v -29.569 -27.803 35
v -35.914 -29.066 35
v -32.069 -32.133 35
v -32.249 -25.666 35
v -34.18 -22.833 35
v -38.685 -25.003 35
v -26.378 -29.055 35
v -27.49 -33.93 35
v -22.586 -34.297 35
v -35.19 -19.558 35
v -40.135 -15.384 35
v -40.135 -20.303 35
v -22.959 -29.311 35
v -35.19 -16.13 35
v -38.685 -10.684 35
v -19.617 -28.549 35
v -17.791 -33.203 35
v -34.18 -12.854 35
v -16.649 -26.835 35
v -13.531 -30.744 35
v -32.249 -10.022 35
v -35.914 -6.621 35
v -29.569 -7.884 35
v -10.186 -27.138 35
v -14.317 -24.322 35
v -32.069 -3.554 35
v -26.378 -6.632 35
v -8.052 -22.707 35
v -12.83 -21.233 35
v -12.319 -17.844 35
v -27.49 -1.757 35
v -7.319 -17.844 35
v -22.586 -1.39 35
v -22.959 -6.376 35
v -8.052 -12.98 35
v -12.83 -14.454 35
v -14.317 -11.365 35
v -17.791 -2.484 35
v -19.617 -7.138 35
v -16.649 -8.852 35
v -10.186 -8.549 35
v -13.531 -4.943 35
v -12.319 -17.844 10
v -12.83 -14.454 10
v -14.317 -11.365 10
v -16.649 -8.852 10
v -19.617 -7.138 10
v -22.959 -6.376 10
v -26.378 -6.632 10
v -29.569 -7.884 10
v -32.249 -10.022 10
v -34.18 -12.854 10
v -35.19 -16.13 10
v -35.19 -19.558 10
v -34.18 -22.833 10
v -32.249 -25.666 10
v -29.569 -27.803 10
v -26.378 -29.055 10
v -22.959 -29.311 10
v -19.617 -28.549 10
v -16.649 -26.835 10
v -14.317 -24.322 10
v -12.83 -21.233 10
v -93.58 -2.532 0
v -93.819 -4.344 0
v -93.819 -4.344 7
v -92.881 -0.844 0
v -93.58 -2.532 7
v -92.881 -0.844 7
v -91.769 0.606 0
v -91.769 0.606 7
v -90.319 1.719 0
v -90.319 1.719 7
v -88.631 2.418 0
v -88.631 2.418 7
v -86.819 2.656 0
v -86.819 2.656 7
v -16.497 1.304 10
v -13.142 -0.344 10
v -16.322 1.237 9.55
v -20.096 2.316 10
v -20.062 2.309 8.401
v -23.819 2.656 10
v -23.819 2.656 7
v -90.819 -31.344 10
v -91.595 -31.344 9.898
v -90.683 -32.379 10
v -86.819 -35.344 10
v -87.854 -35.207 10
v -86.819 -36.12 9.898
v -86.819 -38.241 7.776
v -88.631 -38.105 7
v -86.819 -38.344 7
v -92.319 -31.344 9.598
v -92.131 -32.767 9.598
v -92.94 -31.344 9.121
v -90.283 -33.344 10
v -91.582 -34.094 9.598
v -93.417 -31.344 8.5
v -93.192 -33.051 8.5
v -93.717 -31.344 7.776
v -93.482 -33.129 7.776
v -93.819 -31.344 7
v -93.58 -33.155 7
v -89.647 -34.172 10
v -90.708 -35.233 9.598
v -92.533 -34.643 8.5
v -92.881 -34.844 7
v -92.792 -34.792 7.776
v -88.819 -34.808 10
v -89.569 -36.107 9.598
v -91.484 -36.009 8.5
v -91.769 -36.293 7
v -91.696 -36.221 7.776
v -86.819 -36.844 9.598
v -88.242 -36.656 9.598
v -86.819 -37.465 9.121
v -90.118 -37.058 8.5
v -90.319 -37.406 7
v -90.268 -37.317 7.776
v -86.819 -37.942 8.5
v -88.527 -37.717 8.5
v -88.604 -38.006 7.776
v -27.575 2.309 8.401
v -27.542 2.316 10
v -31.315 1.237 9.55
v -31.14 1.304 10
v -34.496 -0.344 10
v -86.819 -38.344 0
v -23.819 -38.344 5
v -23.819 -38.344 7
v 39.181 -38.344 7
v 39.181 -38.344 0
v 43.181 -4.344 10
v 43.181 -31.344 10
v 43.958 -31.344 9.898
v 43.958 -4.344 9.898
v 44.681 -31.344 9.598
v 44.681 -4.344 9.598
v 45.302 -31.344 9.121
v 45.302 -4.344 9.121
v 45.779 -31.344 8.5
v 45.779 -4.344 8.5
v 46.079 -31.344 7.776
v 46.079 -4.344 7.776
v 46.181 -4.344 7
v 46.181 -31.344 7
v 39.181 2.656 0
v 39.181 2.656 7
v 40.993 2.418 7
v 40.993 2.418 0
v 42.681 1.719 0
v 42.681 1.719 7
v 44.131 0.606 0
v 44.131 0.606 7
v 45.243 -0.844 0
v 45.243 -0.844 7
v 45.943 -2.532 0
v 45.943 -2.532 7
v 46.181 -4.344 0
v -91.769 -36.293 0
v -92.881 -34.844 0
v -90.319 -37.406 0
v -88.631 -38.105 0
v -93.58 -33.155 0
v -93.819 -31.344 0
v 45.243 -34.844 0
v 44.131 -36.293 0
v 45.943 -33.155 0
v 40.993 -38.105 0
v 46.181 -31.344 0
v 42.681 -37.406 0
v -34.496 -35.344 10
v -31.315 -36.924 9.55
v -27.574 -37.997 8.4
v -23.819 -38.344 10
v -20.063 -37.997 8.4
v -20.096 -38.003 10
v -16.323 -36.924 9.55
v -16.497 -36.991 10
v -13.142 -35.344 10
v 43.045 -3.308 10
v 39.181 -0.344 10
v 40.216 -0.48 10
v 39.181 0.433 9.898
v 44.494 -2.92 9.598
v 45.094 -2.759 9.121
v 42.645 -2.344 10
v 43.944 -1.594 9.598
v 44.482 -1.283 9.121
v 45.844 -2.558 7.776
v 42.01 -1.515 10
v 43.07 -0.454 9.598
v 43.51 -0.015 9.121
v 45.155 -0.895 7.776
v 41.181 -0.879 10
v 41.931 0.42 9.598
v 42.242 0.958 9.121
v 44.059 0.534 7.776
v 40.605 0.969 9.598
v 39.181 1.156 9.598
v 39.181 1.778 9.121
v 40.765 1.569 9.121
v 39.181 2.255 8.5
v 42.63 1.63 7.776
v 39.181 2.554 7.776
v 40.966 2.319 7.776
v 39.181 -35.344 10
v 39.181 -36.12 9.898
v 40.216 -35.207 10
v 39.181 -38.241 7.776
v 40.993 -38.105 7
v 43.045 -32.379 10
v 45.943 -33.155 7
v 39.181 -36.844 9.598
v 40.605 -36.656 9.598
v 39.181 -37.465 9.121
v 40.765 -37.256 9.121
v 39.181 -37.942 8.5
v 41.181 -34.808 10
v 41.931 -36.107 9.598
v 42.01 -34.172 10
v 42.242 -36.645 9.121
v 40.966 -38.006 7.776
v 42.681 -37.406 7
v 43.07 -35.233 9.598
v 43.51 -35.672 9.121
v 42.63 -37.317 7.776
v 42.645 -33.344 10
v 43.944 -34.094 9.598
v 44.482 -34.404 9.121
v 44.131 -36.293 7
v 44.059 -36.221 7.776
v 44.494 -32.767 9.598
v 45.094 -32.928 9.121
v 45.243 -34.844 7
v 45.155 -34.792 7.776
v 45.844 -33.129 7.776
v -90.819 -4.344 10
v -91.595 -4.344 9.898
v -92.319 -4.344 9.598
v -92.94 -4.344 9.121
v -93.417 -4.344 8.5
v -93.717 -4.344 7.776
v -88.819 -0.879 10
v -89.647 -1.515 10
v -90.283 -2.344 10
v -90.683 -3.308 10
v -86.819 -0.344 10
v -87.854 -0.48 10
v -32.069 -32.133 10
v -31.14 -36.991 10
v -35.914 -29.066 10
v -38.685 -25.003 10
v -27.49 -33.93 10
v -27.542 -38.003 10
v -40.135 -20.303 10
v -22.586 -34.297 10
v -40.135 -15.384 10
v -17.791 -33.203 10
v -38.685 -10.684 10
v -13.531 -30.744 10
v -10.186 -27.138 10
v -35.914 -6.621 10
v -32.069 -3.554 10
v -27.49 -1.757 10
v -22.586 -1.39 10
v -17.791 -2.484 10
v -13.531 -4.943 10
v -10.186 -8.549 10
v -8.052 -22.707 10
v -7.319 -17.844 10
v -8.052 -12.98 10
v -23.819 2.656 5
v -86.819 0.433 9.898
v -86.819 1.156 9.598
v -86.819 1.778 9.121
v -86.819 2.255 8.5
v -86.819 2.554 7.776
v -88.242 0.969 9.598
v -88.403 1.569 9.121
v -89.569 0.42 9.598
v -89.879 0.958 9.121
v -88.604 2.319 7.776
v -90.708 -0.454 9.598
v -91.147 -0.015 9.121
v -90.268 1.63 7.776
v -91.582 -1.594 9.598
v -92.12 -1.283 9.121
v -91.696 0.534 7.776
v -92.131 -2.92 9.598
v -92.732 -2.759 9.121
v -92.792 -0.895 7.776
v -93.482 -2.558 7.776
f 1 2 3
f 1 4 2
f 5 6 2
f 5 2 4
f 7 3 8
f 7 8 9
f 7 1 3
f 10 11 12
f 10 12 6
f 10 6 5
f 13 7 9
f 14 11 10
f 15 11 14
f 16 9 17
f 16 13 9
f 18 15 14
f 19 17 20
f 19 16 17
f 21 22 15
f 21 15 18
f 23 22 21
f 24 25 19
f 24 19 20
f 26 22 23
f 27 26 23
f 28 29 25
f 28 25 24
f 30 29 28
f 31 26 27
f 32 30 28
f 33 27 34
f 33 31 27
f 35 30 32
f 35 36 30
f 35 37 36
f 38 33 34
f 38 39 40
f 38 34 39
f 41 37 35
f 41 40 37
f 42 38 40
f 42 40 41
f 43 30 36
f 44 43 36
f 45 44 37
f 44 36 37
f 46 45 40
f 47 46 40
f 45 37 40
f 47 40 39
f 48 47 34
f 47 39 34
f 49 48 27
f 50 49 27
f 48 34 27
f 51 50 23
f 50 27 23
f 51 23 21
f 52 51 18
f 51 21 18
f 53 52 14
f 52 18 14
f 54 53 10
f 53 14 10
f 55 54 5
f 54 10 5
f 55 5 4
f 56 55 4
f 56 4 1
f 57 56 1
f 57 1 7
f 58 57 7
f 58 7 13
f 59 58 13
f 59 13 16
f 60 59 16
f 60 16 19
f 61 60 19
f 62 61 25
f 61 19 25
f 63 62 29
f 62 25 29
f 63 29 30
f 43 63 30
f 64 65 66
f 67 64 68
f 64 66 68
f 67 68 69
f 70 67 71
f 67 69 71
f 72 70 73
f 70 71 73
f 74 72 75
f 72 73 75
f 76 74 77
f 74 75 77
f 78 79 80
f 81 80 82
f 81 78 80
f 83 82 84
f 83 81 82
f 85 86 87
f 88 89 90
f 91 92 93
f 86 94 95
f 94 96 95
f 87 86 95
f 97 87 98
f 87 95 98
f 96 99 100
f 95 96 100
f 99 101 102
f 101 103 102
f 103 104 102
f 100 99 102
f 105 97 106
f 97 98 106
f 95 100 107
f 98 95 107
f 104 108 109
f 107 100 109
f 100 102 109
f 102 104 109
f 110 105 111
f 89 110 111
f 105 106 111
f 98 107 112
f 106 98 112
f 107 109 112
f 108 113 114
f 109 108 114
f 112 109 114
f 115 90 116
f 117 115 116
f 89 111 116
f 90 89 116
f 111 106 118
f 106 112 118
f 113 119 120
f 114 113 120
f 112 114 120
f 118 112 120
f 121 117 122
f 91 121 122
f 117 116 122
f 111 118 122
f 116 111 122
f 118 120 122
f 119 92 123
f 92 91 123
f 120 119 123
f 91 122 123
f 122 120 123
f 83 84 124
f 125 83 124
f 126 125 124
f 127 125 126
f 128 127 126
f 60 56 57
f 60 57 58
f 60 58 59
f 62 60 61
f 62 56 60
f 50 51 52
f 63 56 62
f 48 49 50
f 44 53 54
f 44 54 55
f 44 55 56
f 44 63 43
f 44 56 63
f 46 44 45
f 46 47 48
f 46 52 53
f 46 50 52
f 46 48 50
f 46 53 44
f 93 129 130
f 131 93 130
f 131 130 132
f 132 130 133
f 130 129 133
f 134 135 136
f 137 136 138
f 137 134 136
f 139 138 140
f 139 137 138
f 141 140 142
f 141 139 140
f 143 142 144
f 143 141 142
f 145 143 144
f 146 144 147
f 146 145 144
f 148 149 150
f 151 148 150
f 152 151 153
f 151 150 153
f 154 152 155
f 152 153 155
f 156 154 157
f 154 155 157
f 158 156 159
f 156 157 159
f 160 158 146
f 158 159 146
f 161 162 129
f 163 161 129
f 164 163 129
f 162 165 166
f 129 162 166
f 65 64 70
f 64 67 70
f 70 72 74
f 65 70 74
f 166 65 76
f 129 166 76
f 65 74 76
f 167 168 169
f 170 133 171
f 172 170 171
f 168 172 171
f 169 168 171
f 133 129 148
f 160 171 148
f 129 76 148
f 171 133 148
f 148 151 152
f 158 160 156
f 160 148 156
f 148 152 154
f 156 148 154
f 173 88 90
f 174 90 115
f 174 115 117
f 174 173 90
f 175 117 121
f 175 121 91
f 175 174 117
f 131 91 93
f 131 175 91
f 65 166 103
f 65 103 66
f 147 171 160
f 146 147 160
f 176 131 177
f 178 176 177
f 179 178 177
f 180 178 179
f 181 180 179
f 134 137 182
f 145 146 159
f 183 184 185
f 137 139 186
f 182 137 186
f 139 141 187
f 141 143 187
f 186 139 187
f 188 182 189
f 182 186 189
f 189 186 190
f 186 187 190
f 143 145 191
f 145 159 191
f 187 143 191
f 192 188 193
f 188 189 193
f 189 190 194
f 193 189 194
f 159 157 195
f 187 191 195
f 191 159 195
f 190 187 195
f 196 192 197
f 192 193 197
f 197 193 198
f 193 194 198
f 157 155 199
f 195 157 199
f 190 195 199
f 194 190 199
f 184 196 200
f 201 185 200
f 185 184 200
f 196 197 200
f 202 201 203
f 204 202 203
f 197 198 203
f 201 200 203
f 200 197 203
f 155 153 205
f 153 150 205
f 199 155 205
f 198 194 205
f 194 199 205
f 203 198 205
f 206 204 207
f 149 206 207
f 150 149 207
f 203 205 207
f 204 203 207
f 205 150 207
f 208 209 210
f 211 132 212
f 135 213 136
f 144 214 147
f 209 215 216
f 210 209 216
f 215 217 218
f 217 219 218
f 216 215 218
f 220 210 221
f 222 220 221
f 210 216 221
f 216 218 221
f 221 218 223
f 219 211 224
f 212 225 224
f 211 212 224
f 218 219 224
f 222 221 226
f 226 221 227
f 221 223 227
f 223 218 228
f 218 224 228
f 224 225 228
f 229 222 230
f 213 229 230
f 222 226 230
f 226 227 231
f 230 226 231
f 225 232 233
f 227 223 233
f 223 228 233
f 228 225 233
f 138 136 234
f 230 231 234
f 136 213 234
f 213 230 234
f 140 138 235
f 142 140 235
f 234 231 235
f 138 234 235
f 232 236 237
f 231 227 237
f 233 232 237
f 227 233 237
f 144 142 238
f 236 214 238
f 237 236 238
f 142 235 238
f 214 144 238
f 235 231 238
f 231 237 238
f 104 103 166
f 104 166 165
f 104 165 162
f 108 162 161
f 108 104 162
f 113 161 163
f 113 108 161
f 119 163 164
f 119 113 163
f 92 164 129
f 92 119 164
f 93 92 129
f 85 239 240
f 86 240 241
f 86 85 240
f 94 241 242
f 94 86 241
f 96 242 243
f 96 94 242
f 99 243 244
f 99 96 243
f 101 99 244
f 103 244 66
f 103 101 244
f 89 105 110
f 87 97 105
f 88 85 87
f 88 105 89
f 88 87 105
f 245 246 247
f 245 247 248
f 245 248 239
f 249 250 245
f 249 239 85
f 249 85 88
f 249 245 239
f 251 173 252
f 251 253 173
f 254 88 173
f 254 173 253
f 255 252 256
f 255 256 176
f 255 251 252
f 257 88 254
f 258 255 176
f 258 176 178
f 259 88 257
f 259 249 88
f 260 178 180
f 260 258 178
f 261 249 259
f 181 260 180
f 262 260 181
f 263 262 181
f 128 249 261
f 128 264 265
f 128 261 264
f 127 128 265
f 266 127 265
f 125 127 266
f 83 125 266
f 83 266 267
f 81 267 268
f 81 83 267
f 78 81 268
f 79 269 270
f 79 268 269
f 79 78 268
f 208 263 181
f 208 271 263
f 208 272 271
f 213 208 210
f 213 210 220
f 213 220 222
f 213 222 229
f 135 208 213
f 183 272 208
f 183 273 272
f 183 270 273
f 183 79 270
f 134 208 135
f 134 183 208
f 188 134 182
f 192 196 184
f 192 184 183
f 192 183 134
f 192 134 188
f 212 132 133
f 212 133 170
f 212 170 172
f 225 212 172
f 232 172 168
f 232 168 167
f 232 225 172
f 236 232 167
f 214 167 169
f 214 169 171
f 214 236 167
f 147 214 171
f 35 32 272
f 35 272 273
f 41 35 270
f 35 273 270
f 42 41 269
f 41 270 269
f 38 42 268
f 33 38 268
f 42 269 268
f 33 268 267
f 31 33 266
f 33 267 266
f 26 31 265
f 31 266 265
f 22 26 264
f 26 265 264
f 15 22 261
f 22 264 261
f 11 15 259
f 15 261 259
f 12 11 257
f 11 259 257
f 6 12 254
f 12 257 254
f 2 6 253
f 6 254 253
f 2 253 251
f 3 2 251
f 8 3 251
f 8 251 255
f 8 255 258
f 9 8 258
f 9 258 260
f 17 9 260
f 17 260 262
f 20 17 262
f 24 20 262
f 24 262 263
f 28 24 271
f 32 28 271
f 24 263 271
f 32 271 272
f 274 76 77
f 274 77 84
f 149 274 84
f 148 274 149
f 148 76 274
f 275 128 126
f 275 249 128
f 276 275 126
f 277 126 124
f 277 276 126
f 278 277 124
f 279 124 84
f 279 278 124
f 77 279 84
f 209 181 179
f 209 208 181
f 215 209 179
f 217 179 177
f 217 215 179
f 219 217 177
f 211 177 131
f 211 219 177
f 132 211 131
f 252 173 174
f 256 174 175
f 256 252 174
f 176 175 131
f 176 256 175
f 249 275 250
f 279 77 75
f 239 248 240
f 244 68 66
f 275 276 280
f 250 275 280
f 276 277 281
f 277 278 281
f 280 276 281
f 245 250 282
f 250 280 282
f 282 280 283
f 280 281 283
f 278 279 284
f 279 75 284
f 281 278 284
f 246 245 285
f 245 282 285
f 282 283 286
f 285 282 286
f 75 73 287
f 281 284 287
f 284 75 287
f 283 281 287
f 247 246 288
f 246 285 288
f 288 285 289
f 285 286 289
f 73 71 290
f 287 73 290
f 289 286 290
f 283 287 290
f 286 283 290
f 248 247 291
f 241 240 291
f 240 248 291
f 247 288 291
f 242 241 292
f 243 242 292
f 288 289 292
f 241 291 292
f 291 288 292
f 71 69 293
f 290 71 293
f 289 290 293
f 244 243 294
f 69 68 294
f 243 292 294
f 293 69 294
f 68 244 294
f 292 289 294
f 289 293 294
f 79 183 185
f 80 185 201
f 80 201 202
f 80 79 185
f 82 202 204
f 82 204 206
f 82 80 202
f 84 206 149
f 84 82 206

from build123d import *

# Parameters (mm, degrees)
F0_W      = 140
F0_H      = 41
F1_DEPTH  = 10
F3_R      = 16.5
F4_DEPTH  = 25
F5_R      = 11.5
F6_DEPTH  = 25
F8_R      = 7
F9_R      = 3
F11_DEPTH = 5


with BuildPart() as f1:
    # F0 (on Top) → F1 (new body)
    with BuildSketch(Plane.XY):
        with Locations((-23.8188230246, -17.8435179276)):
            Rectangle(F0_W, F0_H)
    extrude(amount=F1_DEPTH)

    # F3 (on face) → F4 (join)
    with BuildSketch(Plane.XY.offset(10)):
        with Locations((-23.8188230246, -17.8435179276)):
            Circle(F3_R)
    extrude(amount=F4_DEPTH)

    # F5 (on face) → F6 (cut)
    with BuildSketch(Plane.XY.offset(35)):
        with Locations((-23.8188230246, -17.8435179276)):
            Circle(F5_R)
    extrude(amount=-F6_DEPTH, mode=Mode.SUBTRACT)

    # F8
    f8_edges = [f1.edges().sort_by_distance(p)[0] for p in [
        (-93.818823, -38.343518, 5),
        (46.181177, -38.343518, 5),
        (46.181177, 2.656482, 5),
        (-93.818823, 2.656482, 5),
    ]]
    fillet(f8_edges, radius=F8_R)

    # F9
    f9_edges = [f1.edges().sort_by_distance(p)[0] for p in [
        (-23.818823, -38.343518, 10),
    ]]
    fillet(f9_edges, radius=F9_R)

    # F10 (on face) → F11 (join)
    with BuildSketch(Plane.XY.offset(10)):
        with BuildLine():
            ThreePointArc((-23.8188230779, -38.3435179276), (-9.3231340291, -32.3392069607), (-3.3188230246, -17.8435179276))
            ThreePointArc((-3.3188230246, -17.8435179276), (-9.3231340103, -3.3478289133), (-23.8188230246, 2.6564820724))
            ThreePointArc((-23.8188230246, 2.6564820724), (-44.3188230246, -17.843517901), (-23.8188230779, -38.3435179276))
        make_face()
    extrude(amount=-F11_DEPTH)


solid = f1.part
